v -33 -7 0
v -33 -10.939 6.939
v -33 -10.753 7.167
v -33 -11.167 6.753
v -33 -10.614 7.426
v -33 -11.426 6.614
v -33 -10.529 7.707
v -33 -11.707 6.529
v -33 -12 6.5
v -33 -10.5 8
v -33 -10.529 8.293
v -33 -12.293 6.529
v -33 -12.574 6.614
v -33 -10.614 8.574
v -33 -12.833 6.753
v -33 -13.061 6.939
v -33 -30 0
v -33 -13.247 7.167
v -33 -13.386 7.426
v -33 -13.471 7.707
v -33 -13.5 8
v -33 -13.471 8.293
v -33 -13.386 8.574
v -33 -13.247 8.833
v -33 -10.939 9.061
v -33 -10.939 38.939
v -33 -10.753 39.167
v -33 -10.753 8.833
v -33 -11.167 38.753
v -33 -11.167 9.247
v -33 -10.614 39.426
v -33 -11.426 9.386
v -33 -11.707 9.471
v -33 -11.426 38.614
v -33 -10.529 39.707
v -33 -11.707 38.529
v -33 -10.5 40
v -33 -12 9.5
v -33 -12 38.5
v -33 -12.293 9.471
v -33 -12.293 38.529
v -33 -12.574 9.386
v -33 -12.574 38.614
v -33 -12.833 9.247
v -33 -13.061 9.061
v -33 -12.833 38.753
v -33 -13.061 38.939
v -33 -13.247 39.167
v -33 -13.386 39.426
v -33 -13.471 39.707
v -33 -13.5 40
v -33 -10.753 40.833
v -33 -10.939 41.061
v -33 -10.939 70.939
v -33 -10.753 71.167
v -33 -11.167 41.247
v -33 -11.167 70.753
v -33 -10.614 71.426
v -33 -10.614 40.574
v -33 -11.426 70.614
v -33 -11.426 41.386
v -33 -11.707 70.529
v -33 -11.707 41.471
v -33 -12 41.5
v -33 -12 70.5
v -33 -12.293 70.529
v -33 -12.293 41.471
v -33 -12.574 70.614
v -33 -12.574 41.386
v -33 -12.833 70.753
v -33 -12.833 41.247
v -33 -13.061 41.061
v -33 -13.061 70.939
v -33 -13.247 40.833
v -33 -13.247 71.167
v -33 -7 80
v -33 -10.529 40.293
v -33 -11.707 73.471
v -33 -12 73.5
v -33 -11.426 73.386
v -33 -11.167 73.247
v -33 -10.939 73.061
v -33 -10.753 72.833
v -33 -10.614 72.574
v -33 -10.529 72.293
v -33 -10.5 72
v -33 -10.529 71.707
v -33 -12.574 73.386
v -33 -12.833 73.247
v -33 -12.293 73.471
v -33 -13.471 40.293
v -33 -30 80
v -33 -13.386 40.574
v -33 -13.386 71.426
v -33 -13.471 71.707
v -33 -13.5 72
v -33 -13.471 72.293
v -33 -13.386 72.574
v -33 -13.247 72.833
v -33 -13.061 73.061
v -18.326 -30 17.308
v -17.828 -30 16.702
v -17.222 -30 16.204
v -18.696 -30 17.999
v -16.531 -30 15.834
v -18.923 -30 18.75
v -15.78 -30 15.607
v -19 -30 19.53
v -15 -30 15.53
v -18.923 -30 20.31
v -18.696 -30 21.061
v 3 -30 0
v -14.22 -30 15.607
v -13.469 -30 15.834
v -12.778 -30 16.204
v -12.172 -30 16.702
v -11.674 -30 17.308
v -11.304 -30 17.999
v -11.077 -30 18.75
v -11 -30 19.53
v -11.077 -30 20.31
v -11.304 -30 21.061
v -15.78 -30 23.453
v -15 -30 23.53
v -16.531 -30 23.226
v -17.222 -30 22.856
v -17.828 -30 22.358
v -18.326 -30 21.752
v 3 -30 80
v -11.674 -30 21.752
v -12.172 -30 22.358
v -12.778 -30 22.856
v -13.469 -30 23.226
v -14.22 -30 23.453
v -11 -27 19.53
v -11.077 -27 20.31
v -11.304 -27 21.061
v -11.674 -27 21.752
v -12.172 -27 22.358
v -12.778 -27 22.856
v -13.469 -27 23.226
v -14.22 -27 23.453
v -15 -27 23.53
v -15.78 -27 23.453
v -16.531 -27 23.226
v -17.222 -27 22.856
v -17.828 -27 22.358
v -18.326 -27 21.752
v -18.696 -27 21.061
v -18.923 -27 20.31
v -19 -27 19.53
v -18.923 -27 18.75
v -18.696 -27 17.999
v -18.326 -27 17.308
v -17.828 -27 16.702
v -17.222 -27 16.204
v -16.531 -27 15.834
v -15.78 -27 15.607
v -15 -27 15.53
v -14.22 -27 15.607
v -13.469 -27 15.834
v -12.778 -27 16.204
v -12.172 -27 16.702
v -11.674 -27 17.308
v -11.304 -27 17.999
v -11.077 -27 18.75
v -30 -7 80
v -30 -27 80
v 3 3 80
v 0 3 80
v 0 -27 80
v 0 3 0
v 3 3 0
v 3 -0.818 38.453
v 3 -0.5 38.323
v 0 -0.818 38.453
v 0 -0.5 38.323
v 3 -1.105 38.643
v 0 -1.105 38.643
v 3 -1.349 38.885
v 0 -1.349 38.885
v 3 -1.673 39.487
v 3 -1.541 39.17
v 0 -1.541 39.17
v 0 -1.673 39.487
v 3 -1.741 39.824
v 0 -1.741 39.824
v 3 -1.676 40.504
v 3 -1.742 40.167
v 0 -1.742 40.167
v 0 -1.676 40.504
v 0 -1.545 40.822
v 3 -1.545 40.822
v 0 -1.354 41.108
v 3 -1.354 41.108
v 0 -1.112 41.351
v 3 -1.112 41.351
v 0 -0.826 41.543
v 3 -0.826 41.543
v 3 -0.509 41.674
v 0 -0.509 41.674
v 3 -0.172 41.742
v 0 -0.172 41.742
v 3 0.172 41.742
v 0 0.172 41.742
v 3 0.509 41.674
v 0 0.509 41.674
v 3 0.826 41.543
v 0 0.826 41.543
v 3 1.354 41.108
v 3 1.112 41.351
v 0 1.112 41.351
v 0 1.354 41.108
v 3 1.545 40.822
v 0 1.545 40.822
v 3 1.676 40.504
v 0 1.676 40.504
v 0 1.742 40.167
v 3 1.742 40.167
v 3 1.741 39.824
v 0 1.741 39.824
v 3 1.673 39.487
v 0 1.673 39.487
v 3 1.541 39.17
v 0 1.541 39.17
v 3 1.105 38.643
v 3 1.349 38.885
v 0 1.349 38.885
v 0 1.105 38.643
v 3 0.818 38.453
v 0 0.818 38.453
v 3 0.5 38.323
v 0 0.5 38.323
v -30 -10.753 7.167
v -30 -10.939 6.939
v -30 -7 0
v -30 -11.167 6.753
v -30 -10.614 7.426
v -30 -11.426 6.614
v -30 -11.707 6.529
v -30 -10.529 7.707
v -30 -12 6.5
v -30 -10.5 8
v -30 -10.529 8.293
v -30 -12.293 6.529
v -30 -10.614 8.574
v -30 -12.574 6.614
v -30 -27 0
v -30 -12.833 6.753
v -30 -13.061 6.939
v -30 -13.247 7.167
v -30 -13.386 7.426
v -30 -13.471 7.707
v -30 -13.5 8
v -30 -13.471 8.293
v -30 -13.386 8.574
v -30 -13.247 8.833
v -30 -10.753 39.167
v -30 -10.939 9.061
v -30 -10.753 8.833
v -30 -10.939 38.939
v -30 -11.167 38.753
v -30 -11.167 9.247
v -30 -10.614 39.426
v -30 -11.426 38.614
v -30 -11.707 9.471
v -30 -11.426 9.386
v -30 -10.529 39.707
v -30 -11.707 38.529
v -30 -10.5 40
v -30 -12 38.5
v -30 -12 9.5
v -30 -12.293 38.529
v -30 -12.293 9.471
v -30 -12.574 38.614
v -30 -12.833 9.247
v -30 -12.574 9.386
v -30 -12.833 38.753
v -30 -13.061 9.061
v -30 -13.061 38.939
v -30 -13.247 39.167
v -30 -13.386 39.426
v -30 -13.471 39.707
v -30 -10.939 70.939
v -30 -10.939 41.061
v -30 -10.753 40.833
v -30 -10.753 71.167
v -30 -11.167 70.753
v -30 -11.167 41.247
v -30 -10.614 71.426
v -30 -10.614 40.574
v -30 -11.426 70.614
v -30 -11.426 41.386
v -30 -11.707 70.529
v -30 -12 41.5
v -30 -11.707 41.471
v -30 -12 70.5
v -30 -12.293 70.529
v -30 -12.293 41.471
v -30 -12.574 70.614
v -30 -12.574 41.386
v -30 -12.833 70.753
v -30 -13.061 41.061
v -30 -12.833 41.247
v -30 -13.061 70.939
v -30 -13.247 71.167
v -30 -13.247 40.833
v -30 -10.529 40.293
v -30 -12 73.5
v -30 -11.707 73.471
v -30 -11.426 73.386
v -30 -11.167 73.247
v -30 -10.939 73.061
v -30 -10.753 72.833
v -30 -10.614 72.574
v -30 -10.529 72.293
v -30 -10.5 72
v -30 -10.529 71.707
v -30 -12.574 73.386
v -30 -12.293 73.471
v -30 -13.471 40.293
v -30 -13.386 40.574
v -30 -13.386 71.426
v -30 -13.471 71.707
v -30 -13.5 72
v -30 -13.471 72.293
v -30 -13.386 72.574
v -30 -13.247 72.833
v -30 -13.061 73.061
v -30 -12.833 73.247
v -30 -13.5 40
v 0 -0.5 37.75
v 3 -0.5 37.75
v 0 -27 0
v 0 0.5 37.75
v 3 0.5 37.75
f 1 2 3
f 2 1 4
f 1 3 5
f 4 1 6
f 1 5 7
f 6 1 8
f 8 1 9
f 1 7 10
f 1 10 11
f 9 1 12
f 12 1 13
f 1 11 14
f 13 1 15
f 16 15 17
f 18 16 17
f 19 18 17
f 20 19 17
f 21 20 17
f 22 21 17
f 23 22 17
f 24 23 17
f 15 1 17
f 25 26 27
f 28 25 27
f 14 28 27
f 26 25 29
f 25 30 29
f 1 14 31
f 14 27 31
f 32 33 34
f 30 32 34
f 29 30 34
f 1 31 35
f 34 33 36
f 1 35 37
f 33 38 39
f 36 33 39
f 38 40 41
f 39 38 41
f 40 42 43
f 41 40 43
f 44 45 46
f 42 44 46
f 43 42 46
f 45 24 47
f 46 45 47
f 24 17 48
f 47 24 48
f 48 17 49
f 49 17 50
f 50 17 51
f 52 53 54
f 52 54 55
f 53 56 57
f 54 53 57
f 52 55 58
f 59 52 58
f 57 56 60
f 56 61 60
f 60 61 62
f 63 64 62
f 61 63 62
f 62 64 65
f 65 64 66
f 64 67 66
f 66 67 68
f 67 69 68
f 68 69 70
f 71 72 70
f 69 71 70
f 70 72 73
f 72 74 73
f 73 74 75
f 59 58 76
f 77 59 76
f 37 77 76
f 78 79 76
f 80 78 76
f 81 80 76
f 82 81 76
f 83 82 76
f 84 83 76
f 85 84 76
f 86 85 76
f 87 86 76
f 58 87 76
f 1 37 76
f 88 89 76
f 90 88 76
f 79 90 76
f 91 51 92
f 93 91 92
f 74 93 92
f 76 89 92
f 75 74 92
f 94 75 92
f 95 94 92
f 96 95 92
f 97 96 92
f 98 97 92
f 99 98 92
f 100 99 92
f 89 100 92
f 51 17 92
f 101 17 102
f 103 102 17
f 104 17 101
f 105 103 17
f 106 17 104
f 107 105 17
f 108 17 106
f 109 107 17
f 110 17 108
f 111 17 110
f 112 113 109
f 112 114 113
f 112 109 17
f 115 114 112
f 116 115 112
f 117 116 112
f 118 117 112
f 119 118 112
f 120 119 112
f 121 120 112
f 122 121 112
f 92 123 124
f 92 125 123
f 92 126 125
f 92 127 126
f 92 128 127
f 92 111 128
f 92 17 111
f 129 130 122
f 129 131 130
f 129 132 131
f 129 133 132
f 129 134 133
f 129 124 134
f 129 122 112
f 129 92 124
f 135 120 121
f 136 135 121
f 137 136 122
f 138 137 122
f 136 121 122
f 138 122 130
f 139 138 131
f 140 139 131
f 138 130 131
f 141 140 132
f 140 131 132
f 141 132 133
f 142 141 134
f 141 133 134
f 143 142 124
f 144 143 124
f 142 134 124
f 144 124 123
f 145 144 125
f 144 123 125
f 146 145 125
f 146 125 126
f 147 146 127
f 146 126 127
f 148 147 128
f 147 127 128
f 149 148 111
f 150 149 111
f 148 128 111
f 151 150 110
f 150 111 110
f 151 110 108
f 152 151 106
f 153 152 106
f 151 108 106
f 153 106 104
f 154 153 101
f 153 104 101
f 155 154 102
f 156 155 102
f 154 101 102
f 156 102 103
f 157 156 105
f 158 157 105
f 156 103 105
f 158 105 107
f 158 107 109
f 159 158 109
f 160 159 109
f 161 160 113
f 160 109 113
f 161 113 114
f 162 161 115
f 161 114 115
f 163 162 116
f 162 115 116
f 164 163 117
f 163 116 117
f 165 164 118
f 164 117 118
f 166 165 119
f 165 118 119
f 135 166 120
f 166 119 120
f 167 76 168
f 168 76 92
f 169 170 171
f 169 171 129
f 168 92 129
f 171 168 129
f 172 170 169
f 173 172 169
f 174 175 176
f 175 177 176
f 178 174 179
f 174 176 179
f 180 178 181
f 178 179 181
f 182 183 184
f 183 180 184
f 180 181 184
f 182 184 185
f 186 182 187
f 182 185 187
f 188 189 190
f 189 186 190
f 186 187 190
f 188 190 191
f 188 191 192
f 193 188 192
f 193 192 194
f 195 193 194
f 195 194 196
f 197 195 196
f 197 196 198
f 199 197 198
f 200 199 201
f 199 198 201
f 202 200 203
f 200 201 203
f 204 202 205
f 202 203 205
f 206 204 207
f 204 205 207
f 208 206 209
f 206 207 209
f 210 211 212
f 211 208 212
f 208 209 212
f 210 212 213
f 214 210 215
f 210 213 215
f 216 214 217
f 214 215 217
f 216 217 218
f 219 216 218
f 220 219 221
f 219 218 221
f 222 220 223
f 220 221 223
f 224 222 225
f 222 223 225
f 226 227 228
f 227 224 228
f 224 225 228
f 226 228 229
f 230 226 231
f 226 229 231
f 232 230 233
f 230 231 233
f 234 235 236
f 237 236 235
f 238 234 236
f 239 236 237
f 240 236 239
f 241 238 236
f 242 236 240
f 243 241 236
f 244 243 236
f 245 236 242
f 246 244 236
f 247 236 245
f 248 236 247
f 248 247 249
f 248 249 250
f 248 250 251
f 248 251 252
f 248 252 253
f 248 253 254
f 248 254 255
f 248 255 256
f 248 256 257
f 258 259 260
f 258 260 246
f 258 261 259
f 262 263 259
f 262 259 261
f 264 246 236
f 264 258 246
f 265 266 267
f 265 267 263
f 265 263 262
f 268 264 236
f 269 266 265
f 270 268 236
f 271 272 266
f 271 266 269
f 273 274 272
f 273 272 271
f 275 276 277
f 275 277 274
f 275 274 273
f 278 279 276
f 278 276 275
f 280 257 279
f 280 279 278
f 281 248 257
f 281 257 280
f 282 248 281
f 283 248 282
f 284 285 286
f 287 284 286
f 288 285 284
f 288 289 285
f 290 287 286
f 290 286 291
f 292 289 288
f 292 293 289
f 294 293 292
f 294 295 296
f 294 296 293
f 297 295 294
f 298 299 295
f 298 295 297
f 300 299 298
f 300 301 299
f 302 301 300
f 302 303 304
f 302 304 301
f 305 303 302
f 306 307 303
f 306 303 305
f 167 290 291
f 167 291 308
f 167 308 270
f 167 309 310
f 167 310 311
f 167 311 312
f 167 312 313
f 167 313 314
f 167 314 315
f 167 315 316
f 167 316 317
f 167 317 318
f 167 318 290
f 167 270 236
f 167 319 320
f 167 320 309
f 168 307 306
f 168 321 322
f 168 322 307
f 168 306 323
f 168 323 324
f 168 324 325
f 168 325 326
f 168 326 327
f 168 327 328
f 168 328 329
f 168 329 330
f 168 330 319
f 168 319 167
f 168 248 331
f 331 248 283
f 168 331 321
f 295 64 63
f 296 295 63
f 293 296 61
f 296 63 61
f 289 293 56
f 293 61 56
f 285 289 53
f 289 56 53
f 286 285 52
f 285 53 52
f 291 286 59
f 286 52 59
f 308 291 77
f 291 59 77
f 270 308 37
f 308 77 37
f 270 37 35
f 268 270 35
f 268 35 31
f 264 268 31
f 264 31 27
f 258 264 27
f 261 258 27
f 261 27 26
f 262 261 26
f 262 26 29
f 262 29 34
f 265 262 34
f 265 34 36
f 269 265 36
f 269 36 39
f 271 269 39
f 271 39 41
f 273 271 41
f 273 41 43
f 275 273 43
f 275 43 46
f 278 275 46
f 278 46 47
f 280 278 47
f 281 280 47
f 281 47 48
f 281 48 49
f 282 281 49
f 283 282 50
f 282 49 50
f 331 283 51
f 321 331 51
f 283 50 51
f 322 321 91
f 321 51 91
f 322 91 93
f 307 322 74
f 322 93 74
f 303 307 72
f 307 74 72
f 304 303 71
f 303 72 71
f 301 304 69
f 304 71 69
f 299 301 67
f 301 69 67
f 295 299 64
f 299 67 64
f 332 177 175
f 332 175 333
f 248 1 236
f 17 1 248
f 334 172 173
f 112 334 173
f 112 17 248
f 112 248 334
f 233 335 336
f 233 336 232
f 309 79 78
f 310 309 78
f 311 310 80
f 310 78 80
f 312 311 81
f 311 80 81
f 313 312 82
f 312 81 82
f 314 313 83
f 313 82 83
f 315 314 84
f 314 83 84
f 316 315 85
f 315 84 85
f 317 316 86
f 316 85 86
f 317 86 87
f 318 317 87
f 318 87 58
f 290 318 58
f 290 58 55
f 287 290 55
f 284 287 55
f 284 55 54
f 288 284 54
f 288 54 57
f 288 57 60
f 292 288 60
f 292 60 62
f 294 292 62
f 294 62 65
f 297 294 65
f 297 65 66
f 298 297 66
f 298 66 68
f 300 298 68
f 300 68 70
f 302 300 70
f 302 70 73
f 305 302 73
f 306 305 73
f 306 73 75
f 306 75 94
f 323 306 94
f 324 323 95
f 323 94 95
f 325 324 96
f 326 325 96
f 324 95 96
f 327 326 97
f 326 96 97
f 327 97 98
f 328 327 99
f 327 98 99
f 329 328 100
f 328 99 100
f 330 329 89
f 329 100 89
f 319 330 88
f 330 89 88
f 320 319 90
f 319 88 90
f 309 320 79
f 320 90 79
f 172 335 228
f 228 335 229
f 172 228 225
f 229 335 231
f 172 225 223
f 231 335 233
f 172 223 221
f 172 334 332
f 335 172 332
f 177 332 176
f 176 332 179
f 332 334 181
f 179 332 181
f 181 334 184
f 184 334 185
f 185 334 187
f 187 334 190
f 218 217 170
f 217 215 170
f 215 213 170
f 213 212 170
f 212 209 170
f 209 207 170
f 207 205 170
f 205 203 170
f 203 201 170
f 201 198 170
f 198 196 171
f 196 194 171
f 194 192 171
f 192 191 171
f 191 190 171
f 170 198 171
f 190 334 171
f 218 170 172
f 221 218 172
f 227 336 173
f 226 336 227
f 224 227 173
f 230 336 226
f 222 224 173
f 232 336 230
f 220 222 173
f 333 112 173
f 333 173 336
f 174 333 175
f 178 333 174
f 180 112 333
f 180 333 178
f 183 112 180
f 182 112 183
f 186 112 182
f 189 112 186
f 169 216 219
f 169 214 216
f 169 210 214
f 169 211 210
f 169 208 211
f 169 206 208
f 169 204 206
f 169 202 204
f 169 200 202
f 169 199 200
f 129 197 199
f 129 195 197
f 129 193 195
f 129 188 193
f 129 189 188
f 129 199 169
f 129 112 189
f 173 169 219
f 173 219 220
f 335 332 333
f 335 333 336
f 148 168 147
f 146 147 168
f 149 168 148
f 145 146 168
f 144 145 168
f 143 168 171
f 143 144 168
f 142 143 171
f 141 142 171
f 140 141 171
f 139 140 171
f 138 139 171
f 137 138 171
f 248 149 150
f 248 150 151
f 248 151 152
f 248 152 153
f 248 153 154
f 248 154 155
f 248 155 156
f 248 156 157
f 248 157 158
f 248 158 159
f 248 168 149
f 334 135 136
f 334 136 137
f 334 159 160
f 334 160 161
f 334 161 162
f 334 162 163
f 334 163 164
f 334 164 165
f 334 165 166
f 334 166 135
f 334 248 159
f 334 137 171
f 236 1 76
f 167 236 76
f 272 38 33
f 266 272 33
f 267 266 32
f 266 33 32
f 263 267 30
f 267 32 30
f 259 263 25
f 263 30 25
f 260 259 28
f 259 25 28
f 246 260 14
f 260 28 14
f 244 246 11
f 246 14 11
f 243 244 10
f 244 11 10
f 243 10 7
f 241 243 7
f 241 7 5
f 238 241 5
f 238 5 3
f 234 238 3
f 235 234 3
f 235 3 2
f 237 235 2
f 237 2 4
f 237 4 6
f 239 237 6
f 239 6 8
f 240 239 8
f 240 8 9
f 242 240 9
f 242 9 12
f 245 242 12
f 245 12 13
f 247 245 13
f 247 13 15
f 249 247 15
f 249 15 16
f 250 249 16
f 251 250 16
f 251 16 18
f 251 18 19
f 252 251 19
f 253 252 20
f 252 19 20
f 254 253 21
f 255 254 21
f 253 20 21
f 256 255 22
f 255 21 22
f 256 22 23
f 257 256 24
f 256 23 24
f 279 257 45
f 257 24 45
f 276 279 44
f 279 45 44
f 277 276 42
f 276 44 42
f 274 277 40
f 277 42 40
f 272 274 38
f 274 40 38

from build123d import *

# Parameters (mm, degrees)
SKETCH2_W           = 30
SKETCH2_H           = 30
SKETCH2_R           = 1.75
BOSS_EXTRUDE1_DEPTH = 2
SKETCH3_W           = 30
SKETCH3_H           = 3
BOSS_EXTRUDE2_DEPTH = 76
SKETCH7_R           = 4
CUT_EXTRUDE1_DEPTH  = 3
SKETCH8_W           = 30
SKETCH8_H           = 2
CUT_EXTRUDE2_DEPTH  = 27
SKETCH9_W           = 3
SKETCH9_H           = 80
BOSS_EXTRUDE3_DEPTH = 33
SKETCH10_R          = 1.75
CUT_EXTRUDE3_DEPTH  = 37
CUT_EXTRUDE4_DEPTH  = 50
CUT_EXTRUDE5_REACH  = 38
SKETCH12_W          = 80
SKETCH12_H          = 10
SKETCH13_R          = 1.5
CUT_EXTRUDE6_DEPTH  = 6


with BuildPart() as part:
    # Sketch2 → Boss-Extrude1 (new body)
    with BuildSketch(Plane.XY):
        with Locations((-15, -15)):
            Rectangle(SKETCH2_W, SKETCH2_H)
        with Locations((-15, -2.5)):
            Circle(SKETCH2_R, mode=Mode.SUBTRACT)
    boss_extrude1 = extrude(amount=BOSS_EXTRUDE1_DEPTH)

    # Sketch3 → Boss-Extrude2 (add)
    with BuildSketch(Plane.XY.offset(2)):
        with Locations((-15, -28.5)):
            Rectangle(SKETCH3_W, SKETCH3_H)
    extrude(amount=BOSS_EXTRUDE2_DEPTH)

    # Mirror1: Boss-Extrude1 across plane
    add(boss_extrude1.mirror(Plane.XY.offset(40)))

    # Sketch7 → Cut-Extrude1 (cut)
    with BuildSketch(Plane(origin=(-25.653020371, -30, -8.772654641), x_dir=(1, 0, 0), z_dir=(0, -1, 0))):
        with Locations((10.653020371, 28.302654641)):
            Circle(SKETCH7_R)
    extrude(amount=-CUT_EXTRUDE1_DEPTH, mode=Mode.SUBTRACT)

    # Sketch8 → Cut-Extrude2 (cut)
    with BuildSketch(Plane(origin=(0, 0, 0), x_dir=(1, 0, 0), z_dir=(0, 1, 0))):
        with Locations((-15, -79)):
            Rectangle(SKETCH8_W, SKETCH8_H)
        with Locations((-15, -1)):
            Rectangle(SKETCH8_W, SKETCH8_H)
    extrude(amount=-CUT_EXTRUDE2_DEPTH, mode=Mode.SUBTRACT)

    # Sketch9 → Boss-Extrude3 (add)
    with BuildSketch(Plane.XZ.offset(30)):
        with Locations((1.5, 40)):
            Rectangle(SKETCH9_W, SKETCH9_H)
        with Locations((-31.5, 40)):
            Rectangle(SKETCH9_W, SKETCH9_H)
    extrude(amount=-BOSS_EXTRUDE3_DEPTH)

    # Sketch10 → Cut-Extrude3 (cut, through all)
    with BuildSketch(Plane.ZY.offset(33)):
        with Locations((40, 0)):
            Circle(SKETCH10_R)
    extrude(amount=-CUT_EXTRUDE3_DEPTH, mode=Mode.SUBTRACT)

    # Sketch11 → Cut-Extrude4 (cut)
    with BuildSketch(Plane(origin=(-33, -23.468882819, -8.772654641), x_dir=(0, 0, 1), z_dir=(-1, 0, 0))):
        with BuildLine():
            Line((47.095603657, 22.968882819), (46.522654641, 22.968882819))
            Line((46.522654641, 22.968882819), (46.522654641, 23.968882819))
            Line((46.522654641, 23.968882819), (47.095603657, 23.968882819))
            ThreePointArc((47.095603657, 23.968882819), (50.522654641, 23.468882819), (47.095603657, 22.968882819))
        make_face()
    extrude(amount=-CUT_EXTRUDE4_DEPTH, mode=Mode.SUBTRACT)

    # Sketch12 → Cut-Extrude5 (cut, up to next)
    with BuildSketch(Plane.ZY.offset(33), mode=Mode.PRIVATE) as cut_extrude5_sk1:
        with Locations((40, -2)):
            Rectangle(SKETCH12_W, SKETCH12_H)
    cut_extrude5_tool1 = extrude(cut_extrude5_sk1.sketch, amount=-CUT_EXTRUDE5_REACH, mode=Mode.PRIVATE) & part.part
    add(cut_extrude5_tool1.solids().sort_by_distance((-33, -2, 40))[0], mode=Mode.SUBTRACT)

    # Sketch13 → Cut-Extrude6 (cut)
    with BuildSketch(Plane(origin=(-36, -23.468882819, -8.772654641), x_dir=(0, 0, 1), z_dir=(-1, 0, 0))):
        with Locations((16.772654641, 11.468882819)):
            Circle(SKETCH13_R)
        with Locations((48.772654641, 11.468882819)):
            Circle(SKETCH13_R)
        with Locations((80.772654641, 11.468882819)):
            Circle(SKETCH13_R)
    extrude(amount=-CUT_EXTRUDE6_DEPTH, mode=Mode.SUBTRACT)


solid = part.part
